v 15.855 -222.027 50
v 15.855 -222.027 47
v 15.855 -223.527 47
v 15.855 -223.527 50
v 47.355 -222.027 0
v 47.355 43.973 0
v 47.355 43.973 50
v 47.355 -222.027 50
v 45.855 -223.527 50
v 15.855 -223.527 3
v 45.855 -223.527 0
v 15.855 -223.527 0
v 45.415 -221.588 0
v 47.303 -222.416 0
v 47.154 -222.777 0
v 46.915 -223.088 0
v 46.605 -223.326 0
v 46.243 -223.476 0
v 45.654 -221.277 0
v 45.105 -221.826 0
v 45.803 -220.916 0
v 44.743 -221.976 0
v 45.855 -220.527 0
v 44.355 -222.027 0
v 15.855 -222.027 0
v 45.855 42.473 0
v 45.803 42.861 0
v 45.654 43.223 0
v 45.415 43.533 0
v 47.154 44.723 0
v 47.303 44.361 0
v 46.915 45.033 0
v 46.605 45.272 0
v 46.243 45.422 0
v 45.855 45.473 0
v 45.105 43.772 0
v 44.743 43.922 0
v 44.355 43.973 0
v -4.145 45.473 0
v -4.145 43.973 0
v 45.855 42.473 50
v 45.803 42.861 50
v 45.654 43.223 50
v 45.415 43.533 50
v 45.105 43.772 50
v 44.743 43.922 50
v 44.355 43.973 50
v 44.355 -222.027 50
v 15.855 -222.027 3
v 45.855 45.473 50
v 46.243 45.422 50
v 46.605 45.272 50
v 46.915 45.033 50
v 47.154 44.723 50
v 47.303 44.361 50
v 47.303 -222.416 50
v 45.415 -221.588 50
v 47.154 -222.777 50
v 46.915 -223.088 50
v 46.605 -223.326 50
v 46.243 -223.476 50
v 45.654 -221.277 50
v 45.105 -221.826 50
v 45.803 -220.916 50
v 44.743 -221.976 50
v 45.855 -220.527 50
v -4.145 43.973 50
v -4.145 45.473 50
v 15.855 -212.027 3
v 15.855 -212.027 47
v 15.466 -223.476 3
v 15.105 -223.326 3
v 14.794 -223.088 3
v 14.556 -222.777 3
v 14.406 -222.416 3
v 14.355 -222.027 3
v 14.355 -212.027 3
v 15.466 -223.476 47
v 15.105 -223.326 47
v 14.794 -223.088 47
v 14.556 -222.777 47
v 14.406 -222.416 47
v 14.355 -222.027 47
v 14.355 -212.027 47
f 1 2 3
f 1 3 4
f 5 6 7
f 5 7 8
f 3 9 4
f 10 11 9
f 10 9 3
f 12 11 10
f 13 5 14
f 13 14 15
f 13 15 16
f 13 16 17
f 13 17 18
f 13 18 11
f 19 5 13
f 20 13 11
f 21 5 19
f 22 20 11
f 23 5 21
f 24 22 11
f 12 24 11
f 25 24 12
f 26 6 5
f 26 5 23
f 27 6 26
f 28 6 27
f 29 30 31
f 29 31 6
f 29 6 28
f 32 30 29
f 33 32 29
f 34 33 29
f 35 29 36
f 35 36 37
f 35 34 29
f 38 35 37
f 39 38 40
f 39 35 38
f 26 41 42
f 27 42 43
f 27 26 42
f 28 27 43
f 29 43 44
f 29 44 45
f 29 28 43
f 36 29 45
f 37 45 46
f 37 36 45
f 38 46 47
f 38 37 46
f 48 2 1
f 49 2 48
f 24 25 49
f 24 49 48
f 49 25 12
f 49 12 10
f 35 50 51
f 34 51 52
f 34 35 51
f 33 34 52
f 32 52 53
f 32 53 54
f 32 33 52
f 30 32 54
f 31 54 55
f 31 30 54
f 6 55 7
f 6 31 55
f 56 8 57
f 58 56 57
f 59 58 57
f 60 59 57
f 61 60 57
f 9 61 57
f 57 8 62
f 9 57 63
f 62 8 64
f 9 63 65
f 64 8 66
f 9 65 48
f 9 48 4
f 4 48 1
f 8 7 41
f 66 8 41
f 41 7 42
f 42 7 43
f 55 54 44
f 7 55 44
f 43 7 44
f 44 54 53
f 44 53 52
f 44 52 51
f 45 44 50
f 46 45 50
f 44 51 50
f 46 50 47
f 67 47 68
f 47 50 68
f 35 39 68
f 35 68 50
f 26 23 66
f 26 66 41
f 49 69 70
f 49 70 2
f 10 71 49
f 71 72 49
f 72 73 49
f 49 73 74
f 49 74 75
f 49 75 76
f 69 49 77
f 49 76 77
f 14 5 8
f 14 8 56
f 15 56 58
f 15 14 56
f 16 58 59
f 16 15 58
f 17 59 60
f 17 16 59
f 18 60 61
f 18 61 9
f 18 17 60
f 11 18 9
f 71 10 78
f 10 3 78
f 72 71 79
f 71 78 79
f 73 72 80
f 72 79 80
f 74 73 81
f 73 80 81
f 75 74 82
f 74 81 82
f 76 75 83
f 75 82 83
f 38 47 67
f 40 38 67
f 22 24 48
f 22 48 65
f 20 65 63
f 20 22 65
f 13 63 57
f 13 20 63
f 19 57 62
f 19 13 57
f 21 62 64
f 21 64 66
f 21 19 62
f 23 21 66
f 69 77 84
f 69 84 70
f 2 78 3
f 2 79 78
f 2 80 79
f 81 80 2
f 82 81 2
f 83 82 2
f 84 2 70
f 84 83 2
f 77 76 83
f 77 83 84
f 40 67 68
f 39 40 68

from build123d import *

# Parameters (mm, degrees)
EXTRUDE_2_DEPTH     = 50
SKETCH_2_W          = 3
SKETCH_2_H          = 11.5
CUT_EXTRUDE_1_DEPTH = 1.5
FILLET_1_R          = 1.5


with BuildPart() as part:
    # 草图1 → 凸台-拉伸2 (new body)
    with BuildSketch(Plane.XY):
        with BuildLine():
            Line((44.354602366, 43.972629848), (15.854602366, 43.972629848))
            Line((15.854602366, 43.972629848), (-4.145397634, 43.972629848))
            Line((-4.145397634, 43.972629848), (-4.145397634, 45.472629848))
            Line((-4.145397634, 45.472629848), (45.854602366, 45.472629848))
            ThreePointArc((45.854602366, 45.472629848), (46.915262538, 45.03329002), (47.354602366, 43.972629848))
            Line((47.354602366, 43.972629848), (47.354602366, -222.027370152))
            ThreePointArc((47.354602366, -222.027370152), (46.915262538, -223.088030324), (45.854602366, -223.527370152))
            Line((45.854602366, -223.527370152), (14.354602366, -223.527370152))
            Line((14.354602366, -223.527370152), (14.354602366, -212.027370152))
            Line((14.354602366, -212.027370152), (15.854602366, -212.027370152))
            Line((15.854602366, -212.027370152), (15.854602366, -222.027370152))
            Line((15.854602366, -222.027370152), (44.354602366, -222.027370152))
            ThreePointArc((44.354602366, -222.027370152), (45.415262538, -221.588030324), (45.854602366, -220.527370152))
            Line((45.854602366, -220.527370152), (45.854602366, -212.027370152))
            Line((45.854602366, -212.027370152), (45.854602366, -36.027370152))
            Line((45.854602366, -36.027370152), (45.854602366, 42.472629848))
            ThreePointArc((45.854602366, 42.472629848), (45.415262538, 43.53329002), (44.354602366, 43.972629848))
        make_face()
    extrude(amount=EXTRUDE_2_DEPTH)

    # 草图2 → 切除-拉伸1 (cut)
    with BuildSketch(Plane.ZY.offset(-14.354602366)):
        with Locations((48.5, -217.777370152)):
            Rectangle(SKETCH_2_W, SKETCH_2_H)
        with Locations((1.5, -217.777370152)):
            Rectangle(SKETCH_2_W, SKETCH_2_H)
    extrude(amount=-CUT_EXTRUDE_1_DEPTH, mode=Mode.SUBTRACT)

    # 圆角1
    fillet_1_edges = [part.edges().sort_by_distance(p)[0] for p in [
        (14.354602366, -223.527370152, 25),
    ]]
    fillet(fillet_1_edges, radius=FILLET_1_R)


solid = part.part
